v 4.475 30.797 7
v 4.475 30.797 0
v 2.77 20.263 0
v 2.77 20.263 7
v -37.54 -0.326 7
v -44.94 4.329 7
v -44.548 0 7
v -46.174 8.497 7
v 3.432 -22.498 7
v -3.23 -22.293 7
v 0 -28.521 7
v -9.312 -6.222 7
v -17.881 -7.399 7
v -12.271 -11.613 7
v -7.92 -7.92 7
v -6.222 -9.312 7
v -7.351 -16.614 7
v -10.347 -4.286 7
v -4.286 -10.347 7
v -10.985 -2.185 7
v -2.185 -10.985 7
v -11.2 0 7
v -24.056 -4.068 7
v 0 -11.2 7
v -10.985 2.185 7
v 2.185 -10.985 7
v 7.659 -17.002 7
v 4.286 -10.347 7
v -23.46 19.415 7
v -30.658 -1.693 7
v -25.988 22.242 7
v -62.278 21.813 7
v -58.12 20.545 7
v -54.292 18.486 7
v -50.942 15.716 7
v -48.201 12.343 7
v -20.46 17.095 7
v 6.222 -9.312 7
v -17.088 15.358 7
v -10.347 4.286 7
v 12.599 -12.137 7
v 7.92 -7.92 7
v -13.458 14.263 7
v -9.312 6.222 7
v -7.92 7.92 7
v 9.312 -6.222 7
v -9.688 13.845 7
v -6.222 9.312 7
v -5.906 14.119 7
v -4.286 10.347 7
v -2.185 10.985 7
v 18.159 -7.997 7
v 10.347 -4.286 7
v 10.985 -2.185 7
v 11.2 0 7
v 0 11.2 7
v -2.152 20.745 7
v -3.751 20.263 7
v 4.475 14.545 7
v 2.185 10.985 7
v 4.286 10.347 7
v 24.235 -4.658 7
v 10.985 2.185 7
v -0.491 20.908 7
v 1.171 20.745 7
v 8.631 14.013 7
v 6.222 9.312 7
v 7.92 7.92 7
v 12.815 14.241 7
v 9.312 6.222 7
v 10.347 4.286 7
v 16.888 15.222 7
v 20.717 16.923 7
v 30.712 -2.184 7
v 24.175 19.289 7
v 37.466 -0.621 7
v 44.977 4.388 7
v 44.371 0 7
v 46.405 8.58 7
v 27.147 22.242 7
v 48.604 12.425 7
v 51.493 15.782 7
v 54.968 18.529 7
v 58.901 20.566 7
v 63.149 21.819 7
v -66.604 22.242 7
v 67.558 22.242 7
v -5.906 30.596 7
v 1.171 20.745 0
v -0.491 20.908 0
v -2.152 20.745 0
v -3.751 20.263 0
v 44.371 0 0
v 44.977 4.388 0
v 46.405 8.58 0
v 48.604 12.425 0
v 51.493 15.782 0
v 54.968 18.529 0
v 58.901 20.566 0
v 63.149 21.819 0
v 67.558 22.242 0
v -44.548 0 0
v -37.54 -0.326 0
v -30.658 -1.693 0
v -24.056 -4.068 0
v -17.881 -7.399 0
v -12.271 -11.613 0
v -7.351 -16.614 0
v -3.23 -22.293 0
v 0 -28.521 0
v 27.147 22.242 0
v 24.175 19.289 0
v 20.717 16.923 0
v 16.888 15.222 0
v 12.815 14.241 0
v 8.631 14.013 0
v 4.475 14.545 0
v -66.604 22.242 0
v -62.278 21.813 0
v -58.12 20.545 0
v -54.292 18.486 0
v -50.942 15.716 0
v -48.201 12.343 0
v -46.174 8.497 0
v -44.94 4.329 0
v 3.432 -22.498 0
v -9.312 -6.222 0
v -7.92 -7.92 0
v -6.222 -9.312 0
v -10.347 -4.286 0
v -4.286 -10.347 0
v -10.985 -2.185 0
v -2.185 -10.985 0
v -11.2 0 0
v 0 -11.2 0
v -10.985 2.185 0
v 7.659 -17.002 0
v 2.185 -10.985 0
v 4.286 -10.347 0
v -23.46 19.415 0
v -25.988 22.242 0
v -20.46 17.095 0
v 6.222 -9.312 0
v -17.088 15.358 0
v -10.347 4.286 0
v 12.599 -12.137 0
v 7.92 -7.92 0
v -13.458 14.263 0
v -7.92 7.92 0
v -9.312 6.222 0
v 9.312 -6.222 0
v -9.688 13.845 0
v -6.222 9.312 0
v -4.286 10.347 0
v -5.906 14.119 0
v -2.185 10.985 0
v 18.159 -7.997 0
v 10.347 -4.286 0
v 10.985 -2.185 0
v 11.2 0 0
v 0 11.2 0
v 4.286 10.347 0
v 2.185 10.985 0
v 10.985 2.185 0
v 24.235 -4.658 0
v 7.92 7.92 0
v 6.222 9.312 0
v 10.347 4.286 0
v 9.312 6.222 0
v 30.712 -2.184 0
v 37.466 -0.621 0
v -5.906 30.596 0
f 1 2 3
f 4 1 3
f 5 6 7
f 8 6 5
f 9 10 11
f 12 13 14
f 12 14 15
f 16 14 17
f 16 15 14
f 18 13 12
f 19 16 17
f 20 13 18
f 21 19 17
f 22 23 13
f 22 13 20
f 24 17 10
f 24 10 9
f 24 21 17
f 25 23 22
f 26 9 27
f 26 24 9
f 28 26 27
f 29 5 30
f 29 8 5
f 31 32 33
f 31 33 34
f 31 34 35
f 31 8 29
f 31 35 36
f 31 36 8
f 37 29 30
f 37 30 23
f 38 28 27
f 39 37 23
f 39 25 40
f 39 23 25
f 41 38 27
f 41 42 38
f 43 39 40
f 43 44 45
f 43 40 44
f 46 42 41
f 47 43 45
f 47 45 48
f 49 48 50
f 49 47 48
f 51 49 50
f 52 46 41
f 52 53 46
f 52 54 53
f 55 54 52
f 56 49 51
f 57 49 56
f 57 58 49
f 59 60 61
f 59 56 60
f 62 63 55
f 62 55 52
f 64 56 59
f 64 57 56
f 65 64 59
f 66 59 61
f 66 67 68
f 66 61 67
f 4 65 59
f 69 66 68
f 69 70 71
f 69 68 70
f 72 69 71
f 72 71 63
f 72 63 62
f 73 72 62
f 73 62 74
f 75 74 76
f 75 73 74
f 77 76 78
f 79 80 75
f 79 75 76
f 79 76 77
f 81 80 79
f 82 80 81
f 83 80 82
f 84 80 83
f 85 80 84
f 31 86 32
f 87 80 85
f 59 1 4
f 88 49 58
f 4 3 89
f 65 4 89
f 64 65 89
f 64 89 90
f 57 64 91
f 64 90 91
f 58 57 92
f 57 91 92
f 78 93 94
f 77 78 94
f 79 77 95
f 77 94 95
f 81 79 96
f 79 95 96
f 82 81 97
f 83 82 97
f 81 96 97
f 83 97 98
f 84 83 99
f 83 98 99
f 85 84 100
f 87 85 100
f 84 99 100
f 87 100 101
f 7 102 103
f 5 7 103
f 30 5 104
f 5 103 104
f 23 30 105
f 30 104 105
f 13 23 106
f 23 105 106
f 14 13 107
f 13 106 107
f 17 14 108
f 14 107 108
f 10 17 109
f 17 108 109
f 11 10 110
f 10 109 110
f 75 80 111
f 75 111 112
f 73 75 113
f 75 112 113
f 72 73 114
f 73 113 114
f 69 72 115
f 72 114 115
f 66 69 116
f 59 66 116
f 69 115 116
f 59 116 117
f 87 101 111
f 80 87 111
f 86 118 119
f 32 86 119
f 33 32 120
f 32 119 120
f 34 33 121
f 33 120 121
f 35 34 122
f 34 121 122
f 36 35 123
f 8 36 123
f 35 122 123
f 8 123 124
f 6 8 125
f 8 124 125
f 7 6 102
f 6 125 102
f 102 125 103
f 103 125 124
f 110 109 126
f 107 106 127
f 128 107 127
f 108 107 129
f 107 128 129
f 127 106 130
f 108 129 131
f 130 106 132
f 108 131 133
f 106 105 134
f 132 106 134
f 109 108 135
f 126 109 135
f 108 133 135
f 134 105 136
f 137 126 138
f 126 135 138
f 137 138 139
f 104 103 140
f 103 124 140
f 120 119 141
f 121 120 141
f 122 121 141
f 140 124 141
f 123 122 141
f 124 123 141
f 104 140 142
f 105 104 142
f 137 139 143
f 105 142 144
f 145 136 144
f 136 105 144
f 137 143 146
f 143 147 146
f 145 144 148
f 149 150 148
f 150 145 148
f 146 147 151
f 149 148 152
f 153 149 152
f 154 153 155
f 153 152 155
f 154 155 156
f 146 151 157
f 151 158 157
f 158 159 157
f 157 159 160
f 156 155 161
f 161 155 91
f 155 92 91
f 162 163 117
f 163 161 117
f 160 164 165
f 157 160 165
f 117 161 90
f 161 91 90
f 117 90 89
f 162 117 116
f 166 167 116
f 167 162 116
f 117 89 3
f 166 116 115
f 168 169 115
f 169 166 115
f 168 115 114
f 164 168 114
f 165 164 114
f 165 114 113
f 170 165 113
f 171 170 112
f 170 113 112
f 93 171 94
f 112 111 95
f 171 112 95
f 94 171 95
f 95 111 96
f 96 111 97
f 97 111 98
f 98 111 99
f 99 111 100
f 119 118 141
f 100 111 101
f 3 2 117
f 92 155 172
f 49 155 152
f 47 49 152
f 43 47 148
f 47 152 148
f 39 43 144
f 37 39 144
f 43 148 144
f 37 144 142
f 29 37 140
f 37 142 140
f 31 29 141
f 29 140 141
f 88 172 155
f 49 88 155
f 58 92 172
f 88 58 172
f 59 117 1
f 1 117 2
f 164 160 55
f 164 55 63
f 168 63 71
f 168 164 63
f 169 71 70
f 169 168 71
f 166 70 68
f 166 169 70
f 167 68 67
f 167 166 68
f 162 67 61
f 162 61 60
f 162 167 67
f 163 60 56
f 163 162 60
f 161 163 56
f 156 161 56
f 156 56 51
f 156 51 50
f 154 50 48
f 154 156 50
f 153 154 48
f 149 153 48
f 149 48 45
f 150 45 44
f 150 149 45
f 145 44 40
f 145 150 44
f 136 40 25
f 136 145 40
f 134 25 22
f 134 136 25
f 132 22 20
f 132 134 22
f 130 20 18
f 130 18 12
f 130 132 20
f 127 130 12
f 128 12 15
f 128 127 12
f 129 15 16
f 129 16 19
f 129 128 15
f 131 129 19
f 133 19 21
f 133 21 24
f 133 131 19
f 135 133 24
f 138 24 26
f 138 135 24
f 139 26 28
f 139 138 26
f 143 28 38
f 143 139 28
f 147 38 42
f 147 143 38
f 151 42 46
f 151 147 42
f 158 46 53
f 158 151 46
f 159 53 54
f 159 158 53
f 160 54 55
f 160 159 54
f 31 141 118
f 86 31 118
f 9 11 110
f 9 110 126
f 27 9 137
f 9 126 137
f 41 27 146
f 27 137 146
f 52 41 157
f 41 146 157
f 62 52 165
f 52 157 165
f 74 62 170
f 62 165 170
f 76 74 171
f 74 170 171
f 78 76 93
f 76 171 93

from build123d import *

# Parameters (mm, degrees)
F0_R     = 11.2
F1_DEPTH = 7


with BuildPart() as f1:
    # F0 (on Top) → F1 (new body)
    with BuildSketch(Plane.XY):
        with BuildLine():
            Line((-25.988072, 22.241659), (-66.603854, 22.241659))
            ThreePointArc((-66.603854, 22.241659), (-50.942339, 15.715839), (-44.548452, 0))
            ThreePointArc((-44.548452, 0), (-17.881455, -7.399281), (0, -28.521109))
            ThreePointArc((0, -28.521109), (18.159278, -7.996654), (44.371225, 0))
            ThreePointArc((44.371225, 0), (51.493322, 15.782316), (67.558273, 22.241659))
            Line((67.558273, 22.241659), (27.147427, 22.241659))
            ThreePointArc((27.147427, 22.241659), (16.888019, 15.22177), (4.475268, 14.545086))
            Line((4.475268, 14.545086), (4.475268, 30.796813))
            Line((4.475268, 30.796813), (2.76984, 20.263286))
            ThreePointArc((2.76984, 20.263286), (-0.490537, 20.907732), (-3.750914, 20.263286))
            Line((-3.750914, 20.263286), (-5.905825, 30.596174))
            Line((-5.905825, 30.596174), (-5.905825, 14.118503))
            ThreePointArc((-5.905825, 14.118503), (-17.08841, 15.358135), (-25.988072, 22.241659))
        make_face()
        Circle(F0_R, mode=Mode.SUBTRACT)
    extrude(amount=F1_DEPTH)


solid = f1.part
